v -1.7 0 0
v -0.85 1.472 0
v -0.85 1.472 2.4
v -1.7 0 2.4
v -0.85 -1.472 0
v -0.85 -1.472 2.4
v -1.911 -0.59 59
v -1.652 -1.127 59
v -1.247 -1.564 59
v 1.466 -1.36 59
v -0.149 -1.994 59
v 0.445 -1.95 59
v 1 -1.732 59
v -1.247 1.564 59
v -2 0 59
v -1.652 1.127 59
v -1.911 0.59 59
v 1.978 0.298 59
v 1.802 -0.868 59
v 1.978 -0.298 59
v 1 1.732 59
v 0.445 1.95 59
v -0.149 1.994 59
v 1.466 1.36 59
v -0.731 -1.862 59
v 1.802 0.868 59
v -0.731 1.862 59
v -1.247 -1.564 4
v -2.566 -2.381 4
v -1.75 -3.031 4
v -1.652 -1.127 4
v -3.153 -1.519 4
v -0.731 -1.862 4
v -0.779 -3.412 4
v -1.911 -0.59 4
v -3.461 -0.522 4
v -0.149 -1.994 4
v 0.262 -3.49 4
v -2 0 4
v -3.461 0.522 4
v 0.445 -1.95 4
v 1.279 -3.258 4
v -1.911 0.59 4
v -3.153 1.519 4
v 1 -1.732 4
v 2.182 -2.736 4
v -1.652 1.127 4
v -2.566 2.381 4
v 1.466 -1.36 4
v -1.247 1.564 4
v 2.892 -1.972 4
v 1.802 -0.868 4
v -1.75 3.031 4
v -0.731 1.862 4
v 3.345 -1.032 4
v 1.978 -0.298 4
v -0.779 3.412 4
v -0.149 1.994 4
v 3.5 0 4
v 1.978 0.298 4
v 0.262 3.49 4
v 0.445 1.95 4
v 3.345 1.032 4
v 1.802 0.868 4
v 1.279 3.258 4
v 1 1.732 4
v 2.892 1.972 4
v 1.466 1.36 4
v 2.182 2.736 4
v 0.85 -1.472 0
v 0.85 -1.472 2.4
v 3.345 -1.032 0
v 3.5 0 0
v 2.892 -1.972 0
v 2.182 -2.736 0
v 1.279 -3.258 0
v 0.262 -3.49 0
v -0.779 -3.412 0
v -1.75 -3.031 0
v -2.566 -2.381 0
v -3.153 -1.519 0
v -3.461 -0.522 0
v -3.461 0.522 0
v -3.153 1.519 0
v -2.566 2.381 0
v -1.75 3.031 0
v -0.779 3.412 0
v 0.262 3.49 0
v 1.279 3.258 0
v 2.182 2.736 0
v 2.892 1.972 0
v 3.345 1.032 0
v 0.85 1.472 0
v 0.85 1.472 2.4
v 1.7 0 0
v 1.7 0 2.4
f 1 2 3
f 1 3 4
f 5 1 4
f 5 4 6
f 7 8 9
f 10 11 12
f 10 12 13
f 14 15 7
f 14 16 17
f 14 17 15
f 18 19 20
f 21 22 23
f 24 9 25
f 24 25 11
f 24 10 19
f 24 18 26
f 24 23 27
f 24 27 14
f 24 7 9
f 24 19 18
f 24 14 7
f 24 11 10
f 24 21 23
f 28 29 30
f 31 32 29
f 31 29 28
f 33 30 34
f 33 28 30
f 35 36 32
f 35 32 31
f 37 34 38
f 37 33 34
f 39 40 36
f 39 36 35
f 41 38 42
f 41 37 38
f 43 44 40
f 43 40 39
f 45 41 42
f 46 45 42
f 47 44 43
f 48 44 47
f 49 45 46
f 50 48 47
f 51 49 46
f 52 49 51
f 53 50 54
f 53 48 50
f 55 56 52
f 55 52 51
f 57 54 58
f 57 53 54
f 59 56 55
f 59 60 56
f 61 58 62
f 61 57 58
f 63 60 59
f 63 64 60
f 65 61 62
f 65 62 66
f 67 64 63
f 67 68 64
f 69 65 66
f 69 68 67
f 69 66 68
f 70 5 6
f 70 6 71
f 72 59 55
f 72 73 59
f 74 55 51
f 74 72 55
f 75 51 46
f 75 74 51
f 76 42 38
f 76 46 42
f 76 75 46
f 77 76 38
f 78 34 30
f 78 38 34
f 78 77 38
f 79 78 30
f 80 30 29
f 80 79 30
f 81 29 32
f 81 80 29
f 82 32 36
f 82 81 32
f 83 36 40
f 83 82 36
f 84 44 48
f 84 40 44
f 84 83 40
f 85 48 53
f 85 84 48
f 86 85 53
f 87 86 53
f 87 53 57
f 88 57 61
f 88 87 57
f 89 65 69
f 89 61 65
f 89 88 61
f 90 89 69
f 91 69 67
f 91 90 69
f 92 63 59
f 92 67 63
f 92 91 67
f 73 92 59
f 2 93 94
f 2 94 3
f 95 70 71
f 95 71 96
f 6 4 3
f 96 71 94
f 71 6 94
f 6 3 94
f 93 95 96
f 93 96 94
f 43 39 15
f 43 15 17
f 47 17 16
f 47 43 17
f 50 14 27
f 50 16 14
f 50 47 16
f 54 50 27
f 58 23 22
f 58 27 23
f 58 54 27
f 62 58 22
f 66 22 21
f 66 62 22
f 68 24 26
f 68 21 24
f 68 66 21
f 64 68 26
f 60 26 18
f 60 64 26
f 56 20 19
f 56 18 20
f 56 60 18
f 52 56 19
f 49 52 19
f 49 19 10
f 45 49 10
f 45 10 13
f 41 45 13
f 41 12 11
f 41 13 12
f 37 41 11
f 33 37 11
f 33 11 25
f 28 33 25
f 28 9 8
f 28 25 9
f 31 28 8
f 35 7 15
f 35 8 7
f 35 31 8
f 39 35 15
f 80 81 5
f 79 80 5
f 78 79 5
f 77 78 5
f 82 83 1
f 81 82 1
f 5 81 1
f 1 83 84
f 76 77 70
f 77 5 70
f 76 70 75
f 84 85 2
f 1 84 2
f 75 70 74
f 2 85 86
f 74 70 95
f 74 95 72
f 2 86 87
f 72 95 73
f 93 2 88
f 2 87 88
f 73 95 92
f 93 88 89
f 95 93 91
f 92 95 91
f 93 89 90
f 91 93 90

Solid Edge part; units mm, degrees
sketch "Sketch1" plane through (0, 0, 0) normal (0, 0, 1) x (1, 0, 0)
  circle A0 centre (0, 0) radius 3.5
extrude "Protrusion1" add sketch "Sketch1" along normal blind 4
sketch "Sketch2" plane through (0, 0, 0) normal (0, 0, -1) x (1, 0, 0)
  line L0 (0.85, 1.4722) -> (1.7, 0)
  line L1 (1.7, 0) -> (0.85, -1.4722)
  line L2 (0.85, -1.4722) -> (-0.85, -1.4722)
  line L3 (-0.85, -1.4722) -> (-1.7, 0)
  line L4 (-1.7, 0) -> (-0.85, 1.4722)
  line L5 (-0.85, 1.4722) -> (0.85, 1.4722)
extrude "ExtrudedCutout_1" cut sketch "Sketch2" against normal blind 2.4
sketch "Sketch3" plane through (0, 0, 4) normal (0, 0, 1) x (-1, 0, 0)
  circle A0 centre (0, 0) radius 2
extrude "ExtrudedProtrusion_2" add sketch "Sketch3" along normal blind 55
cosmetic_thread "Thread_2" size "M4" thread depth 20
properties material "Stainless steel"
